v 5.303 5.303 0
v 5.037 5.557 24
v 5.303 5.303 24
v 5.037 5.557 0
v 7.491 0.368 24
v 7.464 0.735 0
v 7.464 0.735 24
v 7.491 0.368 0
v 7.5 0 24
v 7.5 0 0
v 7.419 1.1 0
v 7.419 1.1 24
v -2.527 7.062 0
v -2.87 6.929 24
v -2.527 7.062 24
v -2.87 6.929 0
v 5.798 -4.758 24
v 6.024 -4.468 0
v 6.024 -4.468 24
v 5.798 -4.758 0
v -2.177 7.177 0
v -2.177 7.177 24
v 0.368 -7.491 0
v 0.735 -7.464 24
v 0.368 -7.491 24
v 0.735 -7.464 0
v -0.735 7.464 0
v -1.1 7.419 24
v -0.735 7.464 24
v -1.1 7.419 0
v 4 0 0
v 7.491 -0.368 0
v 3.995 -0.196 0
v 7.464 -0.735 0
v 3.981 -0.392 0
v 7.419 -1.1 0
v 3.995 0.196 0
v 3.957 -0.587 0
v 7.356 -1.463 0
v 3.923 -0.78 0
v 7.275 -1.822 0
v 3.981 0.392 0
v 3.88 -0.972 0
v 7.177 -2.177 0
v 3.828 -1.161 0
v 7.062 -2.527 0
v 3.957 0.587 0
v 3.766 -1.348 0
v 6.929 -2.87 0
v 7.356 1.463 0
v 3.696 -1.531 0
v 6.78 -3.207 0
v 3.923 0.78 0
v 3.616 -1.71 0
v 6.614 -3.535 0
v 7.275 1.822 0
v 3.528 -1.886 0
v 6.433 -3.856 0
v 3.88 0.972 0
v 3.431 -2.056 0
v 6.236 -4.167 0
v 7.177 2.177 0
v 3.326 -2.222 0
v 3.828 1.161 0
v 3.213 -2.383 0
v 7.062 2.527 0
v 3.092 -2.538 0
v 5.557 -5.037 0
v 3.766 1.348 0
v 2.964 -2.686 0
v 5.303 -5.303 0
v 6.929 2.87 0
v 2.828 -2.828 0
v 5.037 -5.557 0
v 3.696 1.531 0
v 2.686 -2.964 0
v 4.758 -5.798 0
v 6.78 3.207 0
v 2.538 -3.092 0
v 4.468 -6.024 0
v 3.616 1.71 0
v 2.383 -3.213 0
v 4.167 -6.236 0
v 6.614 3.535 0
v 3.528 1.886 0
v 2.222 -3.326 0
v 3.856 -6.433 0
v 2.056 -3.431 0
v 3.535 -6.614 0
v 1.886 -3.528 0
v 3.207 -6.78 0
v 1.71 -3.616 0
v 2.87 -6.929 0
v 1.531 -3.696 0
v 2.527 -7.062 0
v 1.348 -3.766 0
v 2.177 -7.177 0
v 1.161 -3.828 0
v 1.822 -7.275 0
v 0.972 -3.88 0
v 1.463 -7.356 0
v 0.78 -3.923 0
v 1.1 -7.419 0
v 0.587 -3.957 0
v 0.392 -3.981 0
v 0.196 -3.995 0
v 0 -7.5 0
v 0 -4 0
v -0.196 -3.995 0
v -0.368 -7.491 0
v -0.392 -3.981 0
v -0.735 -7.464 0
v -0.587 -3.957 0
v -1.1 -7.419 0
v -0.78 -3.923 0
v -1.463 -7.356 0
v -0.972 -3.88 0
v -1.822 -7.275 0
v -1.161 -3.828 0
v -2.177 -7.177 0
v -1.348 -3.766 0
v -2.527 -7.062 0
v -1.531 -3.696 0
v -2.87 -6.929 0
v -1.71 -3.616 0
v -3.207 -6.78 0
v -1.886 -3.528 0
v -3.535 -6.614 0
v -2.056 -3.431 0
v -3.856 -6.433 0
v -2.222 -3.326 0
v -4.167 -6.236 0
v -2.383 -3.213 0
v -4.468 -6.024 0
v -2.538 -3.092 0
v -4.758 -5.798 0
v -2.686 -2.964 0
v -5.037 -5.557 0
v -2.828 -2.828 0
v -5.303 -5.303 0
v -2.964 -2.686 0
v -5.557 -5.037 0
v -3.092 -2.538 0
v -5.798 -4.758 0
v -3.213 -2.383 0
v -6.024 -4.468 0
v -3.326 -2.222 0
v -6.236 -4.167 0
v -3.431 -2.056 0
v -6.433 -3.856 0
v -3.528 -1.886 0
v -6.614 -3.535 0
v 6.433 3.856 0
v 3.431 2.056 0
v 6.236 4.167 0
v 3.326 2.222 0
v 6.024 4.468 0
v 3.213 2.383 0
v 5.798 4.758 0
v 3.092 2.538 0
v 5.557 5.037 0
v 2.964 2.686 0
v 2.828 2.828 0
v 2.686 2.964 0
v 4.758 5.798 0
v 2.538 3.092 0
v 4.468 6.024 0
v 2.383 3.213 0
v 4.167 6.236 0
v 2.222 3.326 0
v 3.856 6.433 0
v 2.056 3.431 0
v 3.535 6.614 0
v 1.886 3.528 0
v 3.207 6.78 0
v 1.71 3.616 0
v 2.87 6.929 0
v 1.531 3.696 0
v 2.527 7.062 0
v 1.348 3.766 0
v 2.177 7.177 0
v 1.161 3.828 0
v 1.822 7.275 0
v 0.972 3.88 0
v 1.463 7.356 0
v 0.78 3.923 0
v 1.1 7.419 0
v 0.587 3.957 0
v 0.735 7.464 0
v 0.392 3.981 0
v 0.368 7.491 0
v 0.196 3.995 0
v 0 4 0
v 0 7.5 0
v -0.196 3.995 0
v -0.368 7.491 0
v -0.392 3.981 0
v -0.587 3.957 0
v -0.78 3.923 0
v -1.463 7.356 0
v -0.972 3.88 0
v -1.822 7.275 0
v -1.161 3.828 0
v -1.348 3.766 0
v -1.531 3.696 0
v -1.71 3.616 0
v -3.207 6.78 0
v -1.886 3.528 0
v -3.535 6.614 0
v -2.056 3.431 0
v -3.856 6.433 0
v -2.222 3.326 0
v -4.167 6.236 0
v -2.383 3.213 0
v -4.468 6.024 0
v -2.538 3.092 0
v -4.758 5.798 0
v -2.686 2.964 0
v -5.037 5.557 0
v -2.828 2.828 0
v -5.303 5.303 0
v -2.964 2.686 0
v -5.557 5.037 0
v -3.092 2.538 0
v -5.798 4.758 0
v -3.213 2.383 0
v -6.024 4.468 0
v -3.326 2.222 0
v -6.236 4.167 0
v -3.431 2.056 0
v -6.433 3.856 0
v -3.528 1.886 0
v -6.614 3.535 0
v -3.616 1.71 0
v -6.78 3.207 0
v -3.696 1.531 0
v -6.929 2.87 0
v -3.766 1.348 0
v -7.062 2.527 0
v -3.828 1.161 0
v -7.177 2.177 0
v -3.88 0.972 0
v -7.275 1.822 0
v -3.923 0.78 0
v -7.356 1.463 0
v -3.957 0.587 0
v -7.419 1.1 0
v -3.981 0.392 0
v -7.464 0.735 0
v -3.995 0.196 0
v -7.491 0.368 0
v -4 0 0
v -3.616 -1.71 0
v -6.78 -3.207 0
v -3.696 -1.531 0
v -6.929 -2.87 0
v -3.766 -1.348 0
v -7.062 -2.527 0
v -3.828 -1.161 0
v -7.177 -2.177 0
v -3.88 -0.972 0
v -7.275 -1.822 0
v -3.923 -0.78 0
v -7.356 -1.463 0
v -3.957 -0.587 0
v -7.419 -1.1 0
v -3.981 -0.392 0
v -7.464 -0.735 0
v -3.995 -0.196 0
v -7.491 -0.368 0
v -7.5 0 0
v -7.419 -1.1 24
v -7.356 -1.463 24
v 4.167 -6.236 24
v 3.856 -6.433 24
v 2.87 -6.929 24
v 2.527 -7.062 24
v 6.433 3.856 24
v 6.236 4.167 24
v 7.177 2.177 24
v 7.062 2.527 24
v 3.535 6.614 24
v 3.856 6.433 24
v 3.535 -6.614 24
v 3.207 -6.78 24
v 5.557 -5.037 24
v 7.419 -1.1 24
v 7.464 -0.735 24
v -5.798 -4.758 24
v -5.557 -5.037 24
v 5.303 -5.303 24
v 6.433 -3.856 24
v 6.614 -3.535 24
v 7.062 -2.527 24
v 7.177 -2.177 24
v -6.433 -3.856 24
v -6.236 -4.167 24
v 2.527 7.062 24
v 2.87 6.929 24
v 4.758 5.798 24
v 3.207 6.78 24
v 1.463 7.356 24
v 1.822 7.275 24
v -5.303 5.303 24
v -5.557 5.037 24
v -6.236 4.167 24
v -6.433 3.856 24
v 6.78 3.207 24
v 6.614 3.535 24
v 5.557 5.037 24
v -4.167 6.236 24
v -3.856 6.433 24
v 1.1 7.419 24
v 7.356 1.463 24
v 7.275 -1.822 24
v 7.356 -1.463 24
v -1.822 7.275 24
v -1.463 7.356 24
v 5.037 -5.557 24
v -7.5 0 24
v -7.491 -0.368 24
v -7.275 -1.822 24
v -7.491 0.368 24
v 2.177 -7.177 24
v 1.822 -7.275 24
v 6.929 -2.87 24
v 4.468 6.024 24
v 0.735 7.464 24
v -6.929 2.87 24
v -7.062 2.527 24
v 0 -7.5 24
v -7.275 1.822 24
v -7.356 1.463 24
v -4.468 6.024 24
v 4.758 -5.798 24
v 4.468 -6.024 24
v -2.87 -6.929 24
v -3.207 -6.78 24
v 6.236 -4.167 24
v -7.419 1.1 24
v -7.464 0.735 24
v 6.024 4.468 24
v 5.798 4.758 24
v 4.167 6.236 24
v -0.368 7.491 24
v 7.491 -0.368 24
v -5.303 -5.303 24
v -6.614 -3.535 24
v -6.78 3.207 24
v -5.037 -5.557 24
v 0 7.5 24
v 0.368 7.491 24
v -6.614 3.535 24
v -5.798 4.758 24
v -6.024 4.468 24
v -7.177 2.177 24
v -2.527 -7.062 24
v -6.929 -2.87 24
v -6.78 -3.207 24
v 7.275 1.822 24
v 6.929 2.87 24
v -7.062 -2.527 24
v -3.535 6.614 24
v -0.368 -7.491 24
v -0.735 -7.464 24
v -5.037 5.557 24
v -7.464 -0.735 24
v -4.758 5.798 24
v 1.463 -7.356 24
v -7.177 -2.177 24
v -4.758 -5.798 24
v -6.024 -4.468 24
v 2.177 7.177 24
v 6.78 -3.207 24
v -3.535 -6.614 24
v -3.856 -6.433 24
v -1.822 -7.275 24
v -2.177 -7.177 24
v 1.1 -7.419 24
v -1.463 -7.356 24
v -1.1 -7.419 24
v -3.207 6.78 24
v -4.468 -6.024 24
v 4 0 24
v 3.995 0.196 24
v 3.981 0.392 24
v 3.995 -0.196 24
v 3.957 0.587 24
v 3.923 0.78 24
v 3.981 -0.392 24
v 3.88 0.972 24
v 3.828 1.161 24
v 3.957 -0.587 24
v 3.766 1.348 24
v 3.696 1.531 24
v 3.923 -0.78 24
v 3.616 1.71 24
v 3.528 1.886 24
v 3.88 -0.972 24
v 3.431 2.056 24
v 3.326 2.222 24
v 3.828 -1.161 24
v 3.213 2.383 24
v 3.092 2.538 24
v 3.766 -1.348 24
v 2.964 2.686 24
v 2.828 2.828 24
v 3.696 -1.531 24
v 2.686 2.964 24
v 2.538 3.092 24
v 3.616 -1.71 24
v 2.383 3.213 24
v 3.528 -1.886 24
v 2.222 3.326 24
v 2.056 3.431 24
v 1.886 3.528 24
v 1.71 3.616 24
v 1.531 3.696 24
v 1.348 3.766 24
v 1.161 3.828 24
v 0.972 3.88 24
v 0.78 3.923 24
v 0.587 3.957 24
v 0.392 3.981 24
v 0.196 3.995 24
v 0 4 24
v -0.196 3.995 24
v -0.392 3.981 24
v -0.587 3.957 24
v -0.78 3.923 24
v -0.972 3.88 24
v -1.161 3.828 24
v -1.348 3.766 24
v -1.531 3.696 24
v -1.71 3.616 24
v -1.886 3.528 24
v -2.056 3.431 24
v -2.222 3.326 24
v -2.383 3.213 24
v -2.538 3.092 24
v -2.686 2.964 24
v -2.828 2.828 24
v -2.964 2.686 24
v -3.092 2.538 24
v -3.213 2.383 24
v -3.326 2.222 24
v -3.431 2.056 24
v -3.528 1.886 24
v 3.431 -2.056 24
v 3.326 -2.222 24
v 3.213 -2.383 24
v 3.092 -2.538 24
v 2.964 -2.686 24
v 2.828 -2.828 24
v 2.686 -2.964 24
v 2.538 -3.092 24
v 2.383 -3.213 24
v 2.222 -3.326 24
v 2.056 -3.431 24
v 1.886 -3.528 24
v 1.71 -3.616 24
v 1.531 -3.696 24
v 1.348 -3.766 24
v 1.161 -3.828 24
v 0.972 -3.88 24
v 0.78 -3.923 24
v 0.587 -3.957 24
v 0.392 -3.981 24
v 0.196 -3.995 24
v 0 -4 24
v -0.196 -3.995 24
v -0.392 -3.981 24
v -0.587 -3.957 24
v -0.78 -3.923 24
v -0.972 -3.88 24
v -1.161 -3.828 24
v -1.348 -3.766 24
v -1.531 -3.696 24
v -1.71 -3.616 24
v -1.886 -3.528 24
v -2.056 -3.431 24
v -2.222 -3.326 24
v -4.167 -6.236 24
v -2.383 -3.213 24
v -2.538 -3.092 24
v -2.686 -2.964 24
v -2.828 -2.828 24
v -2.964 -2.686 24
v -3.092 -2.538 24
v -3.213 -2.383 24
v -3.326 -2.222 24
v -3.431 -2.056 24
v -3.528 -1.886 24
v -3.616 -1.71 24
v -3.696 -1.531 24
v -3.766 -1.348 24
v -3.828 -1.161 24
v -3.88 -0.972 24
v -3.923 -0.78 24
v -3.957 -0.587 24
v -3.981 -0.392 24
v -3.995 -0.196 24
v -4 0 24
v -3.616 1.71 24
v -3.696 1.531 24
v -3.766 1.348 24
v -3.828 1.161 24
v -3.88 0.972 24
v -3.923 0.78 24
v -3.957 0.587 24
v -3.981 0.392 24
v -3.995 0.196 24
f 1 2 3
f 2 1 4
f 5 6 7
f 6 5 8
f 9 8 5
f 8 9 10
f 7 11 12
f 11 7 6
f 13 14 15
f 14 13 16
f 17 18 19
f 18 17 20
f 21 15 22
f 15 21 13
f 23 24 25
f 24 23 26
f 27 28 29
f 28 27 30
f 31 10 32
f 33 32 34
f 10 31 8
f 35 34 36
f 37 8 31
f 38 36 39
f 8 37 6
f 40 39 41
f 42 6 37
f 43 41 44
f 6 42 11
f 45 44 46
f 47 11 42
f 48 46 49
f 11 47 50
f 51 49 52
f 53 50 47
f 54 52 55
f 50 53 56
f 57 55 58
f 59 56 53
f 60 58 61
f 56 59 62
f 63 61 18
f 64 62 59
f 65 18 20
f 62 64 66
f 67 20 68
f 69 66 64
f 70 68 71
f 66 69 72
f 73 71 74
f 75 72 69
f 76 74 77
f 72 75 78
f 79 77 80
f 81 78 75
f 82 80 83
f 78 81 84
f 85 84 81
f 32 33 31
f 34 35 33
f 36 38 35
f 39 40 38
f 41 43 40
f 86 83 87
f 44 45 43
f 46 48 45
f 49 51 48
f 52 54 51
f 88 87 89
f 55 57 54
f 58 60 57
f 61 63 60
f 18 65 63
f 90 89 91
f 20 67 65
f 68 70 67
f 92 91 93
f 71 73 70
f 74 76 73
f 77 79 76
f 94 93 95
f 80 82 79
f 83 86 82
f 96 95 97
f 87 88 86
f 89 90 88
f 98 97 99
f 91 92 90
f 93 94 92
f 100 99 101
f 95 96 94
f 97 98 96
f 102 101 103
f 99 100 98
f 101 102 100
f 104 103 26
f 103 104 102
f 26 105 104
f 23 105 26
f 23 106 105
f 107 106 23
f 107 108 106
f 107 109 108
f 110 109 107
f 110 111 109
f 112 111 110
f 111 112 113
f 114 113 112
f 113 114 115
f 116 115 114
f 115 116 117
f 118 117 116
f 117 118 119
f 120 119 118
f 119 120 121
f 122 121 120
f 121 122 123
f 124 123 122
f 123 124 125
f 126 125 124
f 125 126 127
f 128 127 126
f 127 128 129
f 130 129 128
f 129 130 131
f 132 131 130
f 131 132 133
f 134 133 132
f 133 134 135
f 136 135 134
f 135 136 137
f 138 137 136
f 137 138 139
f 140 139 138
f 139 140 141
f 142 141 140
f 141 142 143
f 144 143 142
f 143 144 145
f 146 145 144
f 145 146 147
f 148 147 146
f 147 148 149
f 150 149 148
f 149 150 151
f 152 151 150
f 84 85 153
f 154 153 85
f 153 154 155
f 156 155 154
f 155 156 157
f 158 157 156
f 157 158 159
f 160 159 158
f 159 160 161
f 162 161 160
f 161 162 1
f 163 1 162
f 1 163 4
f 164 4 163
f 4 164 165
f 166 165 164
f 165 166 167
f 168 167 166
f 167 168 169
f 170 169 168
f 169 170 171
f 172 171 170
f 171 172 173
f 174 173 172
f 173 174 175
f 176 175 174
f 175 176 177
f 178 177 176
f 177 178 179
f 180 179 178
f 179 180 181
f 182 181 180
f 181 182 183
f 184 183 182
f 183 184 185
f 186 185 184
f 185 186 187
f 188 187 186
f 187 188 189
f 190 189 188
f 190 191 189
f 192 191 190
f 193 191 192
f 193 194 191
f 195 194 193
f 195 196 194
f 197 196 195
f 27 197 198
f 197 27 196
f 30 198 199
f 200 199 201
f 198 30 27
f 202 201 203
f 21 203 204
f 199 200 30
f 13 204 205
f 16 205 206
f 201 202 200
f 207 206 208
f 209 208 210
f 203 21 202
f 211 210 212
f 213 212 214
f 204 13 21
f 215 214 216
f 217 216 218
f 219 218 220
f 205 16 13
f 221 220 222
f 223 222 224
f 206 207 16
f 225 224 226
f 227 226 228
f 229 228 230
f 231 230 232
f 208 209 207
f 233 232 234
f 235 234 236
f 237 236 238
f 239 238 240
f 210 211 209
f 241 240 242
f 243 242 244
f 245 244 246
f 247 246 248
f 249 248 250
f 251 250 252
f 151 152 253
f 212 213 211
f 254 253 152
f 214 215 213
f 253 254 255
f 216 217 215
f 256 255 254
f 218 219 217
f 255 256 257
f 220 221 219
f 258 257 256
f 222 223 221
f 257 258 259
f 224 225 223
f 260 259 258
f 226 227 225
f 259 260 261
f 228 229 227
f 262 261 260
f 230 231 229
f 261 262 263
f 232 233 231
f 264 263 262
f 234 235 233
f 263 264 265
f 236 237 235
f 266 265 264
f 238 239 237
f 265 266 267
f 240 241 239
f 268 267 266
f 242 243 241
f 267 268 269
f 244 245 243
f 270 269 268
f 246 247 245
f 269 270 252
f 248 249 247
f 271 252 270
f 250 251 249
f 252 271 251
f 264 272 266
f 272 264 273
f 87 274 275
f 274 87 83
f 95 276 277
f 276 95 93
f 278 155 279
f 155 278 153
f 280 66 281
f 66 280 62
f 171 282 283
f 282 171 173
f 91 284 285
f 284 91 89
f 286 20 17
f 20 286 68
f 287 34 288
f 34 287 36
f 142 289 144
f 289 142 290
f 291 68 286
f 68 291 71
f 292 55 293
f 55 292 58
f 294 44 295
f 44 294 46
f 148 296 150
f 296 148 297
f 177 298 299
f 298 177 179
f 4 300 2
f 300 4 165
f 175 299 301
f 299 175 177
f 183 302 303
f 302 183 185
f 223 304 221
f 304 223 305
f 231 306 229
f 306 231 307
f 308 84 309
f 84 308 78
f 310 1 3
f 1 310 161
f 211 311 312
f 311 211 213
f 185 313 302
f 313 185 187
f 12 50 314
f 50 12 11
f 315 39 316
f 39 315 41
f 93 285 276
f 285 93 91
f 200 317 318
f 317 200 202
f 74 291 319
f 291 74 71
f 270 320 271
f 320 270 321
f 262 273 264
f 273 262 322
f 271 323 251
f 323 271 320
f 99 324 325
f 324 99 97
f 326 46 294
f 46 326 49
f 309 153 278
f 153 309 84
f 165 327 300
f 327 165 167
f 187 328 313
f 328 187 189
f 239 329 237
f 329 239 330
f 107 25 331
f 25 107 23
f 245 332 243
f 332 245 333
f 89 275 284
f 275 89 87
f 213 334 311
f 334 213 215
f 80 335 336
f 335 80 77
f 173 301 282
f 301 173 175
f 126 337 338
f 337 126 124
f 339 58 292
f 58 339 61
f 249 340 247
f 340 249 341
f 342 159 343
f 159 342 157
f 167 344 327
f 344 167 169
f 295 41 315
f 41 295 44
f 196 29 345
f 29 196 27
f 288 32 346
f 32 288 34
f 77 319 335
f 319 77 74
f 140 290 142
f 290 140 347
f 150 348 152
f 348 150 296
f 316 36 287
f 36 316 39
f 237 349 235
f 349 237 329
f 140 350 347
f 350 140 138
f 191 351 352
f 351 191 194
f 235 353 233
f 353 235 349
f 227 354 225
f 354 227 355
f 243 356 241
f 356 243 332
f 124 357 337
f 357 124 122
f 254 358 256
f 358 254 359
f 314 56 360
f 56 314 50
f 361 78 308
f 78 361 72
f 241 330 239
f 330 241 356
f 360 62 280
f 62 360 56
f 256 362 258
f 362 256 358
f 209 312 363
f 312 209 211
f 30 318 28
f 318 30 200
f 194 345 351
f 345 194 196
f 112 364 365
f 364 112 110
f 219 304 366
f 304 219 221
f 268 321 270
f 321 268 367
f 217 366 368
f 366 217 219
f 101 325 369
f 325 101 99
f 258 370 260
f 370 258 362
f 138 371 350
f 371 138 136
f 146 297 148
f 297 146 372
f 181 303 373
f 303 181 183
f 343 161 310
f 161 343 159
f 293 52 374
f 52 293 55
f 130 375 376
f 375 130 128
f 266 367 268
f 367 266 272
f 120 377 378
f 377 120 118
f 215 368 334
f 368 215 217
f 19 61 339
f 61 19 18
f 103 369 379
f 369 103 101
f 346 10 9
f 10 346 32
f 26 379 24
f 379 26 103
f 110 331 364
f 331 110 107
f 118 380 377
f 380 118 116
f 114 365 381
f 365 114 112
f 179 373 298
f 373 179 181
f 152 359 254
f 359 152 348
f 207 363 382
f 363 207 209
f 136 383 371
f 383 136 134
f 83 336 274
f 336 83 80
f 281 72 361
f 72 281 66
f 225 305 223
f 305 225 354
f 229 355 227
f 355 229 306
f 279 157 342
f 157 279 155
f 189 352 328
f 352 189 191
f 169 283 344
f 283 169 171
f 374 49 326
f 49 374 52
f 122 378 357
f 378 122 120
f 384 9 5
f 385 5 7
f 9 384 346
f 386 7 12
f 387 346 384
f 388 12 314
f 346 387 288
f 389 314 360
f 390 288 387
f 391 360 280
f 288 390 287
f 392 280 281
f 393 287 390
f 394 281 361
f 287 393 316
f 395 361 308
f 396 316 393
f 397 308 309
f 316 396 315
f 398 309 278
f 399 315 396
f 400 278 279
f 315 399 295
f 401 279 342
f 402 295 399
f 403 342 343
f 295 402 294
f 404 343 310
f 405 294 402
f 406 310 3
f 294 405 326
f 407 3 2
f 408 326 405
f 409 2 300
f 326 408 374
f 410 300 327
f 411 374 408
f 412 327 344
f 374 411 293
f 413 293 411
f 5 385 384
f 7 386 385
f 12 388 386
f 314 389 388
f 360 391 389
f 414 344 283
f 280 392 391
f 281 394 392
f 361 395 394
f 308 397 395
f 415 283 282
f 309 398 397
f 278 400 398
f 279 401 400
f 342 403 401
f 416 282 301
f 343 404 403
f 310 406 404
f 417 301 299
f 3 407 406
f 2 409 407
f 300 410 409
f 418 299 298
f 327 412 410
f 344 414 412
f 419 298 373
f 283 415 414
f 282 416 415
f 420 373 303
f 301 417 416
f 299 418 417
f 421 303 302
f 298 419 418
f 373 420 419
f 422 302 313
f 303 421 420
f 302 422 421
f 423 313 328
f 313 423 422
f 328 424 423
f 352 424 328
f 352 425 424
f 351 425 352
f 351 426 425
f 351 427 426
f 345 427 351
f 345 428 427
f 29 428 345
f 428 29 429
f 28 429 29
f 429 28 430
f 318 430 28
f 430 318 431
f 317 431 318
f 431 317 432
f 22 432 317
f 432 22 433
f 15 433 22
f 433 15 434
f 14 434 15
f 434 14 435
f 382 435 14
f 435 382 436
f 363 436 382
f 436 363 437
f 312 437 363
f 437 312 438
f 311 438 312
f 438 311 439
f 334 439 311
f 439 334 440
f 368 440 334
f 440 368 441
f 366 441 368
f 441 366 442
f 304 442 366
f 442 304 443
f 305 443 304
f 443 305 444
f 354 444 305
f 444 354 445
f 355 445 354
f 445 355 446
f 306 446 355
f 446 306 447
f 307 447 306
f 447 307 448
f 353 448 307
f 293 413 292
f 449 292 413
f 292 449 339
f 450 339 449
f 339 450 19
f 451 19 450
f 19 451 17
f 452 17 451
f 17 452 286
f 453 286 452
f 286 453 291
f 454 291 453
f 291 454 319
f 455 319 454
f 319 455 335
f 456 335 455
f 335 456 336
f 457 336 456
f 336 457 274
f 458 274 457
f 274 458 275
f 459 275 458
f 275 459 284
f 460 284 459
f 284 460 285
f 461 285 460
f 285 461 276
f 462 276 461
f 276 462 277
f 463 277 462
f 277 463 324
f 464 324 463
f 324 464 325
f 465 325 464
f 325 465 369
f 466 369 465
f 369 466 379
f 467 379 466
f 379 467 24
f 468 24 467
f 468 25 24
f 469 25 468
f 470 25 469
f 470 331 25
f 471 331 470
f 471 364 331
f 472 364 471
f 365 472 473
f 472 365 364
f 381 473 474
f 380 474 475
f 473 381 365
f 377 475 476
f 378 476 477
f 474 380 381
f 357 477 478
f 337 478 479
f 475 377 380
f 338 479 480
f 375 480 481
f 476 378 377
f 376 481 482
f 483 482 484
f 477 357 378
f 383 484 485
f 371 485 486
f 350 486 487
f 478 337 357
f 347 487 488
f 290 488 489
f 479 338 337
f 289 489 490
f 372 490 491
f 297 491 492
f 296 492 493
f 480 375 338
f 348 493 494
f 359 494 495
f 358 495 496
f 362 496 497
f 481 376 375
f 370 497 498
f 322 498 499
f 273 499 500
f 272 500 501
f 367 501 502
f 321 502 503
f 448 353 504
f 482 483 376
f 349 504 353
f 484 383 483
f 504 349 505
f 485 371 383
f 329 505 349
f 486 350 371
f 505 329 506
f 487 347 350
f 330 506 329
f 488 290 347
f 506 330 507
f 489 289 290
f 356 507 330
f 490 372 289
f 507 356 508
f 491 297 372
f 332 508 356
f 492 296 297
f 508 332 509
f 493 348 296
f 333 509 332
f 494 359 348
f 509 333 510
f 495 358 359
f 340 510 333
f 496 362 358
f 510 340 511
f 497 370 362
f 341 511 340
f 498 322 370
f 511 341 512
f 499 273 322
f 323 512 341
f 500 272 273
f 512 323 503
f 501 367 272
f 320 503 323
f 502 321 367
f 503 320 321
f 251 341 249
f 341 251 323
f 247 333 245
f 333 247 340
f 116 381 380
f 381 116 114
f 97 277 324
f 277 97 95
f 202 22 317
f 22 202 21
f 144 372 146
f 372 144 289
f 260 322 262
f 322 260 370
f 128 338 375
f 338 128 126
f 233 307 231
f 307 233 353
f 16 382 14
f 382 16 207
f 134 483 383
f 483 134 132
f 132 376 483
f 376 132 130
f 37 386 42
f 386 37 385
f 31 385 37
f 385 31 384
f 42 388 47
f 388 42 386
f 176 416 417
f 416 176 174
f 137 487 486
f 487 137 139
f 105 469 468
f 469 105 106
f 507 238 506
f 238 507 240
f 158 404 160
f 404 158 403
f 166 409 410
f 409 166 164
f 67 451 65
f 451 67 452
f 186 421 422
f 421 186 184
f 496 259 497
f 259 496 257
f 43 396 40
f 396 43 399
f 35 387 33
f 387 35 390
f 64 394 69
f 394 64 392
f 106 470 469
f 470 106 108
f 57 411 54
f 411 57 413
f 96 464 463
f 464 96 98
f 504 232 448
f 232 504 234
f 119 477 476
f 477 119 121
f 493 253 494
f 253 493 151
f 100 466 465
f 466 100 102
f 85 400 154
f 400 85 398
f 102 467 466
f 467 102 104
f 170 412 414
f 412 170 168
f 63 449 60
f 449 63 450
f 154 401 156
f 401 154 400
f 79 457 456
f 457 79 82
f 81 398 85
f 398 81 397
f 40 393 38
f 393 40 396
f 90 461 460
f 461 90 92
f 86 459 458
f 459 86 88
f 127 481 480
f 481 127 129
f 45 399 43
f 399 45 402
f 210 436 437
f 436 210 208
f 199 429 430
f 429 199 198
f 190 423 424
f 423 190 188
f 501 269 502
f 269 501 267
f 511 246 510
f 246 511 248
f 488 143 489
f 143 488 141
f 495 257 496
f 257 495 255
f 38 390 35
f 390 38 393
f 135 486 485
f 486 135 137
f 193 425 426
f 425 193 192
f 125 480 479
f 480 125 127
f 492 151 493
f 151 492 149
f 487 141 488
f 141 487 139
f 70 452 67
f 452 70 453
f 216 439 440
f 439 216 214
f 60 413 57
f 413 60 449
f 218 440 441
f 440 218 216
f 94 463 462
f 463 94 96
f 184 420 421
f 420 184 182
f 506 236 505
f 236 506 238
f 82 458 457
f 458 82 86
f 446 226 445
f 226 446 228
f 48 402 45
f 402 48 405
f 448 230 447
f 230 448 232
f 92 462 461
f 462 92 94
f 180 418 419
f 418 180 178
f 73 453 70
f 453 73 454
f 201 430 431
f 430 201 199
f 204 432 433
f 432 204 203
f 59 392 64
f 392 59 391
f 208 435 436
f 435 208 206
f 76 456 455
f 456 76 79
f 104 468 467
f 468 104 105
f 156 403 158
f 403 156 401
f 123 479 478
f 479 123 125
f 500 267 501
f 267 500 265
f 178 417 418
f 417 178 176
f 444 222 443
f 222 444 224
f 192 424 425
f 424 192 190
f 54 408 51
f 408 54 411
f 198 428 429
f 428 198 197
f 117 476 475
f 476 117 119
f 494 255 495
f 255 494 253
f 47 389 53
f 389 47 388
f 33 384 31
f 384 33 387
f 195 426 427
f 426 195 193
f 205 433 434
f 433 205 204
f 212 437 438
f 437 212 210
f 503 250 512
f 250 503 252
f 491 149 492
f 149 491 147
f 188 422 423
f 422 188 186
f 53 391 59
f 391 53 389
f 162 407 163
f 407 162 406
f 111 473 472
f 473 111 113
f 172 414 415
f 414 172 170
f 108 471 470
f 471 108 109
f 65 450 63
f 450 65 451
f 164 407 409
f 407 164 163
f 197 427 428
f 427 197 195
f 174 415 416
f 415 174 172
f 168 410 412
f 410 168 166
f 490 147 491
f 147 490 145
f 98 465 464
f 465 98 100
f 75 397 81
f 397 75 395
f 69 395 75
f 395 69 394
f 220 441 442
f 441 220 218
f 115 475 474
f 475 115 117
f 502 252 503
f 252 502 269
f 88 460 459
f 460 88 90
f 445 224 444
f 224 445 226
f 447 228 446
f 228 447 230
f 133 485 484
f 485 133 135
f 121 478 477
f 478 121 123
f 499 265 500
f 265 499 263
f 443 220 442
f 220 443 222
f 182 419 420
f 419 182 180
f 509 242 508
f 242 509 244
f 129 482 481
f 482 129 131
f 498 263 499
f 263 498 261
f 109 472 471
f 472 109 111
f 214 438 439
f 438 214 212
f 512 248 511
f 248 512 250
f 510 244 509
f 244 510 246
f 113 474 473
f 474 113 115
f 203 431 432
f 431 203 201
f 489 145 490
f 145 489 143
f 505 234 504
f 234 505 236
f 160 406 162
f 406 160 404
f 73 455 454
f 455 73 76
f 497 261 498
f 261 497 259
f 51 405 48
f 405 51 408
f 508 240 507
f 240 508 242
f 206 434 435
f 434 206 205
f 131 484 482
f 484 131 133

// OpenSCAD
$fn = 128;

bore_d = 8.0;
outer_d = 15.0;
length = 24.0;

difference() {
  cylinder(d = outer_d, h = length, center = false);
  translate([0, 0, -0.1])
    cylinder(d = bore_d, h = length + 0.2, center = false);
}
